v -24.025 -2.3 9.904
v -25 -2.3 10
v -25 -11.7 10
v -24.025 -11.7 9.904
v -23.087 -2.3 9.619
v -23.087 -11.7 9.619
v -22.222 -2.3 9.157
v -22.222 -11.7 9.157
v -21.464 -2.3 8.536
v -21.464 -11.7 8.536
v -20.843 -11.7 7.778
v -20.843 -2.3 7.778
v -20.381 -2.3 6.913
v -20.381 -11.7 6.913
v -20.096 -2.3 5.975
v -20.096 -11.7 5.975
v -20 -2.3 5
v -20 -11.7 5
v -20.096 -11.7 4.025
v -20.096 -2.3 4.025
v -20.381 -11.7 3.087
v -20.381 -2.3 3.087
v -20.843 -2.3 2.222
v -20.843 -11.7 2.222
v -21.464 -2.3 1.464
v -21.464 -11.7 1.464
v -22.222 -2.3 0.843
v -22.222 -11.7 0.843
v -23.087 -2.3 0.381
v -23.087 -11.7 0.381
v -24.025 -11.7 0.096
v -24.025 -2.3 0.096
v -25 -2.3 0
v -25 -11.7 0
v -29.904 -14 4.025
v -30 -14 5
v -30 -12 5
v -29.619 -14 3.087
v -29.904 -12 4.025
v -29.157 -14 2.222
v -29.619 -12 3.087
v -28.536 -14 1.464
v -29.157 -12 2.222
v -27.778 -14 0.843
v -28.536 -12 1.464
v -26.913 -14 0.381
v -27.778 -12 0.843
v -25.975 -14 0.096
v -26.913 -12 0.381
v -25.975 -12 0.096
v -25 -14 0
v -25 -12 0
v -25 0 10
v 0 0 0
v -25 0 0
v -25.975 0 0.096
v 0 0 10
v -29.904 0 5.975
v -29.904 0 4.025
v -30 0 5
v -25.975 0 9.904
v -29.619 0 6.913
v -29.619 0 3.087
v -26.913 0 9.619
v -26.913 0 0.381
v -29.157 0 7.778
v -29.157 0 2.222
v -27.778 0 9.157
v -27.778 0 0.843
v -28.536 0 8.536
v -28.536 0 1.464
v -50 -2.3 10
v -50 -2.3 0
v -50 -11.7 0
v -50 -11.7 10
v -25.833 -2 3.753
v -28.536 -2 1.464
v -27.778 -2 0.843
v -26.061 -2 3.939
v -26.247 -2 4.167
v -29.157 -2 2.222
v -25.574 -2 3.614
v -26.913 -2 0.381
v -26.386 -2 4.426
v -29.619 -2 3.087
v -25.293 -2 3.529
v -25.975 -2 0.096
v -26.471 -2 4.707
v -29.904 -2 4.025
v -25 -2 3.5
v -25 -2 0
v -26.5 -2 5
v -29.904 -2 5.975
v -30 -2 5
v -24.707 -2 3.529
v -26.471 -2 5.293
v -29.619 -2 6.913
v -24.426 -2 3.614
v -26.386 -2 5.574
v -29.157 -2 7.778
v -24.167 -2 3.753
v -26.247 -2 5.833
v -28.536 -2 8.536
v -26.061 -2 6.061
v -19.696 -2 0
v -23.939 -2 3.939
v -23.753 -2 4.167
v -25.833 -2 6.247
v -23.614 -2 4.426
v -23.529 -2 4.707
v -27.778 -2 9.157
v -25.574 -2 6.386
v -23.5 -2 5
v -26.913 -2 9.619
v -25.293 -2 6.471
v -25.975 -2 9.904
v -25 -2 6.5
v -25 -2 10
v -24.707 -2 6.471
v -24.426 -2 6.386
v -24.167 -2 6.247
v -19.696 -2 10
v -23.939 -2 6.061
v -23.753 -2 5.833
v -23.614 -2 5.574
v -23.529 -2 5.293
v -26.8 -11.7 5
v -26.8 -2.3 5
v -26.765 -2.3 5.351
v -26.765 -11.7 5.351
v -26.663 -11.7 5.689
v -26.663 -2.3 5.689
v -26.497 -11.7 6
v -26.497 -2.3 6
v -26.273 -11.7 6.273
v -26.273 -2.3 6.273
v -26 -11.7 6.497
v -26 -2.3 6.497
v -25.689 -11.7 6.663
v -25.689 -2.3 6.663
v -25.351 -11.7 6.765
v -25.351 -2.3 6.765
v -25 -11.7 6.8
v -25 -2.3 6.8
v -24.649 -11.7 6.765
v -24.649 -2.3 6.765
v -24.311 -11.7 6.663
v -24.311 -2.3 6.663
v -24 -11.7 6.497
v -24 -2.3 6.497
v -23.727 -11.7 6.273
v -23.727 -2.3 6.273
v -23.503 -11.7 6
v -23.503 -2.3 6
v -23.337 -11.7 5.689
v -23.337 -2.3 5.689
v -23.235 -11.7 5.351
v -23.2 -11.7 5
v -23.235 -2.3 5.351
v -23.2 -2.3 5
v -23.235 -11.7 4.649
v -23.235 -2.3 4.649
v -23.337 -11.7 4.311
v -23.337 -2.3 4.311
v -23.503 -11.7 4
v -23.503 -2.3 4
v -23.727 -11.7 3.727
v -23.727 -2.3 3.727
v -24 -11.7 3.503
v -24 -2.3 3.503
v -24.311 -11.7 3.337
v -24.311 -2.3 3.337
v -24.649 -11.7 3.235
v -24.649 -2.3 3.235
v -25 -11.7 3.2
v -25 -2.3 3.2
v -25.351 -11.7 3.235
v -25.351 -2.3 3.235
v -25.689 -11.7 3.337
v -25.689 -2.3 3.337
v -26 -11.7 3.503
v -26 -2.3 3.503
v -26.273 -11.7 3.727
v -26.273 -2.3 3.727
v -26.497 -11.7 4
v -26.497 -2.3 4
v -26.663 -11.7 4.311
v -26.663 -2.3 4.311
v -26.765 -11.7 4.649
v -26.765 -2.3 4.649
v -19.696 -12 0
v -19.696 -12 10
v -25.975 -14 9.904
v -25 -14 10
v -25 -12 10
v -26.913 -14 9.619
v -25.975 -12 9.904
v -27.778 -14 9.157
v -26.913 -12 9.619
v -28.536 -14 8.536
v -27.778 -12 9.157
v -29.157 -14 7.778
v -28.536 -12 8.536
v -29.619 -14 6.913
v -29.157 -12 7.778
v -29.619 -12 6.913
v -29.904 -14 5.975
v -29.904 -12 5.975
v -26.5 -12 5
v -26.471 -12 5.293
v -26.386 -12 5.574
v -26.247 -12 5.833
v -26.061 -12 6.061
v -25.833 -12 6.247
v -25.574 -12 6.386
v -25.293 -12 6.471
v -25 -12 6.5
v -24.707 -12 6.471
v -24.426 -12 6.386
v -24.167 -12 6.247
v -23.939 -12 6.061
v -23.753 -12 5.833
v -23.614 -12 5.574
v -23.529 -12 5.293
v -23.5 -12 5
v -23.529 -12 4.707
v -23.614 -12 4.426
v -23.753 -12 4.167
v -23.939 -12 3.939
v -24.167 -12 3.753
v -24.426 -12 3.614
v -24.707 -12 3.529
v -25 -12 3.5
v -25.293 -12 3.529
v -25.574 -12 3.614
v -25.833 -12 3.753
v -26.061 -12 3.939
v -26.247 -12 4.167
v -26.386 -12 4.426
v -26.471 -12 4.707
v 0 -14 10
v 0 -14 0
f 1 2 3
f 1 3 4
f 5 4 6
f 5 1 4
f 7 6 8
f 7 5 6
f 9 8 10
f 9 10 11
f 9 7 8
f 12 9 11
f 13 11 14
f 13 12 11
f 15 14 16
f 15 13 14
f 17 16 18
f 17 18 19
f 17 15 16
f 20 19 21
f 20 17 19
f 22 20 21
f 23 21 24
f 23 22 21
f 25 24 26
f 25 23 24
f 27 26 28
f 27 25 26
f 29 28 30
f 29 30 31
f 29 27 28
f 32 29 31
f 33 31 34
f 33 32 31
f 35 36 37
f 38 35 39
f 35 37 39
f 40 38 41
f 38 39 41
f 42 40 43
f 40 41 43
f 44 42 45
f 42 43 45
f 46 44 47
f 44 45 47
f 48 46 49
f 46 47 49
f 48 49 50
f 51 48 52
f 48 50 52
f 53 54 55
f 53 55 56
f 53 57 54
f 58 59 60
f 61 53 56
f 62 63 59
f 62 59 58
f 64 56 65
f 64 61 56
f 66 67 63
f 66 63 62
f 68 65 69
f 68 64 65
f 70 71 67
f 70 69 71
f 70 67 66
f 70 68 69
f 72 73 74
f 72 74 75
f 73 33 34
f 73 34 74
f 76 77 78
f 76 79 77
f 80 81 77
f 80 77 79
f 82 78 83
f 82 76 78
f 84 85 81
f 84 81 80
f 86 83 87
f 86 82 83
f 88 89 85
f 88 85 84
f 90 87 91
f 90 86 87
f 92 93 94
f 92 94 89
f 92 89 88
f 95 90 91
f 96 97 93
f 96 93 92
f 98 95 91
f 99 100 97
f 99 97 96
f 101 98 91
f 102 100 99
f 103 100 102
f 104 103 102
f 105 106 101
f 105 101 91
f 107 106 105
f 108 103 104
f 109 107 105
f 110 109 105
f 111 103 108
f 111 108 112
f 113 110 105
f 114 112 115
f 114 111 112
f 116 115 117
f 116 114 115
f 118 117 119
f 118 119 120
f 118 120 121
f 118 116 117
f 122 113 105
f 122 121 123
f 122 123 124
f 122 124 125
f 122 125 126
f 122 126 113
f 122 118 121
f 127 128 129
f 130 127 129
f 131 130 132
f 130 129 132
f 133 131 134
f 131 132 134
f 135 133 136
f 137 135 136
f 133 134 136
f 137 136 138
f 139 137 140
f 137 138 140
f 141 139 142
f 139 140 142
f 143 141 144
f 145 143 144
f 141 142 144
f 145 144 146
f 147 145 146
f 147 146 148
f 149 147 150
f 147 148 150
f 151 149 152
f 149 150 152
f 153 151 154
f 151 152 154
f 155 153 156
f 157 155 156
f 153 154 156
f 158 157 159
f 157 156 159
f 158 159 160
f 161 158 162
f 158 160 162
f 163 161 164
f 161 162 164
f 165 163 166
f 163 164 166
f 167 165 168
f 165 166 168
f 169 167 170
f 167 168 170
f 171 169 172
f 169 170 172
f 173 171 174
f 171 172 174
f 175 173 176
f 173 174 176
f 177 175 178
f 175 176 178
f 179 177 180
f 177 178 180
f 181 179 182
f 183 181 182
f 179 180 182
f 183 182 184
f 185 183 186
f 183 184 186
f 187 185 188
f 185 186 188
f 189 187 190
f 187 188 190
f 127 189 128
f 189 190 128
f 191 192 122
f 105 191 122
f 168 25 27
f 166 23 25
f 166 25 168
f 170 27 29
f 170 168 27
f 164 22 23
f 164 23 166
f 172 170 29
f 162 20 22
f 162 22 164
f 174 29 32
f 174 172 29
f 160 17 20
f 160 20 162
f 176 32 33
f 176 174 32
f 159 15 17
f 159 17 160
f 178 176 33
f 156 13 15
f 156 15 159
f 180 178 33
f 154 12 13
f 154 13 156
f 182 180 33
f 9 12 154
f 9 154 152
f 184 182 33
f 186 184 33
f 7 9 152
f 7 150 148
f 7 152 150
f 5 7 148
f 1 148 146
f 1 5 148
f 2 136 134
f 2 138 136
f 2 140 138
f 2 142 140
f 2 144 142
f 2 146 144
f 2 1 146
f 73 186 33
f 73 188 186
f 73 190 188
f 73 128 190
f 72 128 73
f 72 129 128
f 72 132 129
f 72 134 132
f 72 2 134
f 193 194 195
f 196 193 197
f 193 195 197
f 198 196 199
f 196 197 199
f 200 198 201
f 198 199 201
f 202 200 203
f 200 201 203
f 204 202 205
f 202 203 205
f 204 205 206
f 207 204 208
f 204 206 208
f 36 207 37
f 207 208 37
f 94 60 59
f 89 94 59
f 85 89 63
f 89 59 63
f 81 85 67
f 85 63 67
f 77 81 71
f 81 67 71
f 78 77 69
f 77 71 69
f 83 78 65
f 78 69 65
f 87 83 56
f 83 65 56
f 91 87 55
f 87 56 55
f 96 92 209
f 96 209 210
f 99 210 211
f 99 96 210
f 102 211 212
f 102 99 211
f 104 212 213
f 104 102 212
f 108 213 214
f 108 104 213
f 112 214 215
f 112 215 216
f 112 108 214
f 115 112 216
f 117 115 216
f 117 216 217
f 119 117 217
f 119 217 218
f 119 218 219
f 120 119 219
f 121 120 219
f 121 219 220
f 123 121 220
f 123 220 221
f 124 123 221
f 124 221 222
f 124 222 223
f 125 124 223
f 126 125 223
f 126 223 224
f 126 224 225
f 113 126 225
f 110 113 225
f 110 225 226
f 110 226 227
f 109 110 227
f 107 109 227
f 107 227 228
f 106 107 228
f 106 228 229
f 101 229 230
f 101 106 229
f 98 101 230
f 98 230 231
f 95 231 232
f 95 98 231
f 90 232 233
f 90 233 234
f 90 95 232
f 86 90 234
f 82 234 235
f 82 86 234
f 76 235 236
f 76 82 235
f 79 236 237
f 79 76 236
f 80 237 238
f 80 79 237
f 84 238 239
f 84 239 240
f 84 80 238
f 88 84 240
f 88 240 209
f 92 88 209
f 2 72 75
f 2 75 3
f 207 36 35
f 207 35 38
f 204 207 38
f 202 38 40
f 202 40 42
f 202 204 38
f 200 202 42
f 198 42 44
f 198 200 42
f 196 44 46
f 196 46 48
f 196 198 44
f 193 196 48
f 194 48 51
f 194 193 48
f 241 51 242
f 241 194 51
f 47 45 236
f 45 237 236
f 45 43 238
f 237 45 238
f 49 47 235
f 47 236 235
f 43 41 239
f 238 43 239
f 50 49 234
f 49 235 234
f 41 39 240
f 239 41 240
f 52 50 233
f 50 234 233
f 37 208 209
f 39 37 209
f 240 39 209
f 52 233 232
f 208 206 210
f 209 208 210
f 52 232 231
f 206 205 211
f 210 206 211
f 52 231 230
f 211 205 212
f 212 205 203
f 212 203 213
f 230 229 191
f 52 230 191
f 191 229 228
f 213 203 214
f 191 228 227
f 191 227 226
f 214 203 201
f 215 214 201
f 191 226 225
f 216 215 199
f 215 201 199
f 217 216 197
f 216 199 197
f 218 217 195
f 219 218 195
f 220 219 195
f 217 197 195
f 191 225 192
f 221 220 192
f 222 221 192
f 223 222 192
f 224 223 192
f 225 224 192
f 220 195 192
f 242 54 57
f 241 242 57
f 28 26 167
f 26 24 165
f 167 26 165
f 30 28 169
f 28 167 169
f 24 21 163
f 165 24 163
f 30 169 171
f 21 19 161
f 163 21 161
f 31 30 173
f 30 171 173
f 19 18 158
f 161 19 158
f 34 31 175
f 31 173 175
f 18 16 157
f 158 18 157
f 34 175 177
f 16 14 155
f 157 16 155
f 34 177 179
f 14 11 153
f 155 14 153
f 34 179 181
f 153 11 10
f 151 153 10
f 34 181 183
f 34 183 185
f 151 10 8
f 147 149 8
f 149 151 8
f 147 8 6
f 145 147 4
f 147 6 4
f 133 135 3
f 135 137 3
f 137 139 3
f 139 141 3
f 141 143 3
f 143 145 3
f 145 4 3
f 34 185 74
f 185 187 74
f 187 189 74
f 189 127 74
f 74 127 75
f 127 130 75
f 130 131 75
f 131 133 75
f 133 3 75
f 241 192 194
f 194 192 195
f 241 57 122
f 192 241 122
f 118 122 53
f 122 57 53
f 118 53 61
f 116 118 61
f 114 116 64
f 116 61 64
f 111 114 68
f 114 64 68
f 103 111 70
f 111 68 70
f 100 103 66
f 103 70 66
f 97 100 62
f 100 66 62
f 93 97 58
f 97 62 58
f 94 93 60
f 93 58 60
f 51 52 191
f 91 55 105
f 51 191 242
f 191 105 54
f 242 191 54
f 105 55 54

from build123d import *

# Parameters (mm, degrees)
F1_DEPTH = 14
F2_W     = 10.4
F2_H     = 10
F3_DEPTH = 10.001
F4_R     = 1.5
F5_DEPTH = 12
F7_R     = 1.8
F8_DEPTH = 9.4


with BuildPart() as f1:
    # F0 (on Front) → F1 (new body)
    with BuildSketch(Plane.XZ):
        with BuildLine():
            Line((-25, 0), (0, 0))
            Line((0, 0), (0, 10))
            Line((0, 10), (-25, 10))
            ThreePointArc((-25, 10), (-28.5355339059, 8.5355339059), (-30, 5))
            ThreePointArc((-30, 5), (-28.5355339059, 1.4644660941), (-25, 0))
        make_face()
    extrude(amount=F1_DEPTH)

    # F2 (on face) → F3 (cut, through all)
    with BuildSketch(Plane.XY.offset(10)):
        with Locations((-24.8957956722, -7)):
            Rectangle(F2_W, F2_H)
    extrude(amount=-F3_DEPTH, mode=Mode.SUBTRACT)

    # F4 (on face) → F5 (join, through all)
    with BuildSketch(Plane(origin=(0, 0, 0), x_dir=(-1, 0, 0), z_dir=(0, 1, 0))):
        with Locations((25, 5)):
            Circle(F4_R)
    extrude(amount=-F5_DEPTH)


with BuildPart() as f8:
    # F7 (on offset) → F8 (new body)
    with BuildSketch(Plane(origin=(0, -2.3, 0), x_dir=(-1, 0, 0), z_dir=(0, 1, 0))):
        with BuildLine():
            Line((50, 10), (25, 10))
            ThreePointArc((25, 10), (20, 5), (25, 0))
            Line((25, 0), (50, 0))
            Line((50, 0), (50, 10))
        make_face()
        with Locations((25, 5)):
            Circle(F7_R, mode=Mode.SUBTRACT)
    extrude(amount=-F8_DEPTH)


solid = Compound([f1.part, f8.part])
